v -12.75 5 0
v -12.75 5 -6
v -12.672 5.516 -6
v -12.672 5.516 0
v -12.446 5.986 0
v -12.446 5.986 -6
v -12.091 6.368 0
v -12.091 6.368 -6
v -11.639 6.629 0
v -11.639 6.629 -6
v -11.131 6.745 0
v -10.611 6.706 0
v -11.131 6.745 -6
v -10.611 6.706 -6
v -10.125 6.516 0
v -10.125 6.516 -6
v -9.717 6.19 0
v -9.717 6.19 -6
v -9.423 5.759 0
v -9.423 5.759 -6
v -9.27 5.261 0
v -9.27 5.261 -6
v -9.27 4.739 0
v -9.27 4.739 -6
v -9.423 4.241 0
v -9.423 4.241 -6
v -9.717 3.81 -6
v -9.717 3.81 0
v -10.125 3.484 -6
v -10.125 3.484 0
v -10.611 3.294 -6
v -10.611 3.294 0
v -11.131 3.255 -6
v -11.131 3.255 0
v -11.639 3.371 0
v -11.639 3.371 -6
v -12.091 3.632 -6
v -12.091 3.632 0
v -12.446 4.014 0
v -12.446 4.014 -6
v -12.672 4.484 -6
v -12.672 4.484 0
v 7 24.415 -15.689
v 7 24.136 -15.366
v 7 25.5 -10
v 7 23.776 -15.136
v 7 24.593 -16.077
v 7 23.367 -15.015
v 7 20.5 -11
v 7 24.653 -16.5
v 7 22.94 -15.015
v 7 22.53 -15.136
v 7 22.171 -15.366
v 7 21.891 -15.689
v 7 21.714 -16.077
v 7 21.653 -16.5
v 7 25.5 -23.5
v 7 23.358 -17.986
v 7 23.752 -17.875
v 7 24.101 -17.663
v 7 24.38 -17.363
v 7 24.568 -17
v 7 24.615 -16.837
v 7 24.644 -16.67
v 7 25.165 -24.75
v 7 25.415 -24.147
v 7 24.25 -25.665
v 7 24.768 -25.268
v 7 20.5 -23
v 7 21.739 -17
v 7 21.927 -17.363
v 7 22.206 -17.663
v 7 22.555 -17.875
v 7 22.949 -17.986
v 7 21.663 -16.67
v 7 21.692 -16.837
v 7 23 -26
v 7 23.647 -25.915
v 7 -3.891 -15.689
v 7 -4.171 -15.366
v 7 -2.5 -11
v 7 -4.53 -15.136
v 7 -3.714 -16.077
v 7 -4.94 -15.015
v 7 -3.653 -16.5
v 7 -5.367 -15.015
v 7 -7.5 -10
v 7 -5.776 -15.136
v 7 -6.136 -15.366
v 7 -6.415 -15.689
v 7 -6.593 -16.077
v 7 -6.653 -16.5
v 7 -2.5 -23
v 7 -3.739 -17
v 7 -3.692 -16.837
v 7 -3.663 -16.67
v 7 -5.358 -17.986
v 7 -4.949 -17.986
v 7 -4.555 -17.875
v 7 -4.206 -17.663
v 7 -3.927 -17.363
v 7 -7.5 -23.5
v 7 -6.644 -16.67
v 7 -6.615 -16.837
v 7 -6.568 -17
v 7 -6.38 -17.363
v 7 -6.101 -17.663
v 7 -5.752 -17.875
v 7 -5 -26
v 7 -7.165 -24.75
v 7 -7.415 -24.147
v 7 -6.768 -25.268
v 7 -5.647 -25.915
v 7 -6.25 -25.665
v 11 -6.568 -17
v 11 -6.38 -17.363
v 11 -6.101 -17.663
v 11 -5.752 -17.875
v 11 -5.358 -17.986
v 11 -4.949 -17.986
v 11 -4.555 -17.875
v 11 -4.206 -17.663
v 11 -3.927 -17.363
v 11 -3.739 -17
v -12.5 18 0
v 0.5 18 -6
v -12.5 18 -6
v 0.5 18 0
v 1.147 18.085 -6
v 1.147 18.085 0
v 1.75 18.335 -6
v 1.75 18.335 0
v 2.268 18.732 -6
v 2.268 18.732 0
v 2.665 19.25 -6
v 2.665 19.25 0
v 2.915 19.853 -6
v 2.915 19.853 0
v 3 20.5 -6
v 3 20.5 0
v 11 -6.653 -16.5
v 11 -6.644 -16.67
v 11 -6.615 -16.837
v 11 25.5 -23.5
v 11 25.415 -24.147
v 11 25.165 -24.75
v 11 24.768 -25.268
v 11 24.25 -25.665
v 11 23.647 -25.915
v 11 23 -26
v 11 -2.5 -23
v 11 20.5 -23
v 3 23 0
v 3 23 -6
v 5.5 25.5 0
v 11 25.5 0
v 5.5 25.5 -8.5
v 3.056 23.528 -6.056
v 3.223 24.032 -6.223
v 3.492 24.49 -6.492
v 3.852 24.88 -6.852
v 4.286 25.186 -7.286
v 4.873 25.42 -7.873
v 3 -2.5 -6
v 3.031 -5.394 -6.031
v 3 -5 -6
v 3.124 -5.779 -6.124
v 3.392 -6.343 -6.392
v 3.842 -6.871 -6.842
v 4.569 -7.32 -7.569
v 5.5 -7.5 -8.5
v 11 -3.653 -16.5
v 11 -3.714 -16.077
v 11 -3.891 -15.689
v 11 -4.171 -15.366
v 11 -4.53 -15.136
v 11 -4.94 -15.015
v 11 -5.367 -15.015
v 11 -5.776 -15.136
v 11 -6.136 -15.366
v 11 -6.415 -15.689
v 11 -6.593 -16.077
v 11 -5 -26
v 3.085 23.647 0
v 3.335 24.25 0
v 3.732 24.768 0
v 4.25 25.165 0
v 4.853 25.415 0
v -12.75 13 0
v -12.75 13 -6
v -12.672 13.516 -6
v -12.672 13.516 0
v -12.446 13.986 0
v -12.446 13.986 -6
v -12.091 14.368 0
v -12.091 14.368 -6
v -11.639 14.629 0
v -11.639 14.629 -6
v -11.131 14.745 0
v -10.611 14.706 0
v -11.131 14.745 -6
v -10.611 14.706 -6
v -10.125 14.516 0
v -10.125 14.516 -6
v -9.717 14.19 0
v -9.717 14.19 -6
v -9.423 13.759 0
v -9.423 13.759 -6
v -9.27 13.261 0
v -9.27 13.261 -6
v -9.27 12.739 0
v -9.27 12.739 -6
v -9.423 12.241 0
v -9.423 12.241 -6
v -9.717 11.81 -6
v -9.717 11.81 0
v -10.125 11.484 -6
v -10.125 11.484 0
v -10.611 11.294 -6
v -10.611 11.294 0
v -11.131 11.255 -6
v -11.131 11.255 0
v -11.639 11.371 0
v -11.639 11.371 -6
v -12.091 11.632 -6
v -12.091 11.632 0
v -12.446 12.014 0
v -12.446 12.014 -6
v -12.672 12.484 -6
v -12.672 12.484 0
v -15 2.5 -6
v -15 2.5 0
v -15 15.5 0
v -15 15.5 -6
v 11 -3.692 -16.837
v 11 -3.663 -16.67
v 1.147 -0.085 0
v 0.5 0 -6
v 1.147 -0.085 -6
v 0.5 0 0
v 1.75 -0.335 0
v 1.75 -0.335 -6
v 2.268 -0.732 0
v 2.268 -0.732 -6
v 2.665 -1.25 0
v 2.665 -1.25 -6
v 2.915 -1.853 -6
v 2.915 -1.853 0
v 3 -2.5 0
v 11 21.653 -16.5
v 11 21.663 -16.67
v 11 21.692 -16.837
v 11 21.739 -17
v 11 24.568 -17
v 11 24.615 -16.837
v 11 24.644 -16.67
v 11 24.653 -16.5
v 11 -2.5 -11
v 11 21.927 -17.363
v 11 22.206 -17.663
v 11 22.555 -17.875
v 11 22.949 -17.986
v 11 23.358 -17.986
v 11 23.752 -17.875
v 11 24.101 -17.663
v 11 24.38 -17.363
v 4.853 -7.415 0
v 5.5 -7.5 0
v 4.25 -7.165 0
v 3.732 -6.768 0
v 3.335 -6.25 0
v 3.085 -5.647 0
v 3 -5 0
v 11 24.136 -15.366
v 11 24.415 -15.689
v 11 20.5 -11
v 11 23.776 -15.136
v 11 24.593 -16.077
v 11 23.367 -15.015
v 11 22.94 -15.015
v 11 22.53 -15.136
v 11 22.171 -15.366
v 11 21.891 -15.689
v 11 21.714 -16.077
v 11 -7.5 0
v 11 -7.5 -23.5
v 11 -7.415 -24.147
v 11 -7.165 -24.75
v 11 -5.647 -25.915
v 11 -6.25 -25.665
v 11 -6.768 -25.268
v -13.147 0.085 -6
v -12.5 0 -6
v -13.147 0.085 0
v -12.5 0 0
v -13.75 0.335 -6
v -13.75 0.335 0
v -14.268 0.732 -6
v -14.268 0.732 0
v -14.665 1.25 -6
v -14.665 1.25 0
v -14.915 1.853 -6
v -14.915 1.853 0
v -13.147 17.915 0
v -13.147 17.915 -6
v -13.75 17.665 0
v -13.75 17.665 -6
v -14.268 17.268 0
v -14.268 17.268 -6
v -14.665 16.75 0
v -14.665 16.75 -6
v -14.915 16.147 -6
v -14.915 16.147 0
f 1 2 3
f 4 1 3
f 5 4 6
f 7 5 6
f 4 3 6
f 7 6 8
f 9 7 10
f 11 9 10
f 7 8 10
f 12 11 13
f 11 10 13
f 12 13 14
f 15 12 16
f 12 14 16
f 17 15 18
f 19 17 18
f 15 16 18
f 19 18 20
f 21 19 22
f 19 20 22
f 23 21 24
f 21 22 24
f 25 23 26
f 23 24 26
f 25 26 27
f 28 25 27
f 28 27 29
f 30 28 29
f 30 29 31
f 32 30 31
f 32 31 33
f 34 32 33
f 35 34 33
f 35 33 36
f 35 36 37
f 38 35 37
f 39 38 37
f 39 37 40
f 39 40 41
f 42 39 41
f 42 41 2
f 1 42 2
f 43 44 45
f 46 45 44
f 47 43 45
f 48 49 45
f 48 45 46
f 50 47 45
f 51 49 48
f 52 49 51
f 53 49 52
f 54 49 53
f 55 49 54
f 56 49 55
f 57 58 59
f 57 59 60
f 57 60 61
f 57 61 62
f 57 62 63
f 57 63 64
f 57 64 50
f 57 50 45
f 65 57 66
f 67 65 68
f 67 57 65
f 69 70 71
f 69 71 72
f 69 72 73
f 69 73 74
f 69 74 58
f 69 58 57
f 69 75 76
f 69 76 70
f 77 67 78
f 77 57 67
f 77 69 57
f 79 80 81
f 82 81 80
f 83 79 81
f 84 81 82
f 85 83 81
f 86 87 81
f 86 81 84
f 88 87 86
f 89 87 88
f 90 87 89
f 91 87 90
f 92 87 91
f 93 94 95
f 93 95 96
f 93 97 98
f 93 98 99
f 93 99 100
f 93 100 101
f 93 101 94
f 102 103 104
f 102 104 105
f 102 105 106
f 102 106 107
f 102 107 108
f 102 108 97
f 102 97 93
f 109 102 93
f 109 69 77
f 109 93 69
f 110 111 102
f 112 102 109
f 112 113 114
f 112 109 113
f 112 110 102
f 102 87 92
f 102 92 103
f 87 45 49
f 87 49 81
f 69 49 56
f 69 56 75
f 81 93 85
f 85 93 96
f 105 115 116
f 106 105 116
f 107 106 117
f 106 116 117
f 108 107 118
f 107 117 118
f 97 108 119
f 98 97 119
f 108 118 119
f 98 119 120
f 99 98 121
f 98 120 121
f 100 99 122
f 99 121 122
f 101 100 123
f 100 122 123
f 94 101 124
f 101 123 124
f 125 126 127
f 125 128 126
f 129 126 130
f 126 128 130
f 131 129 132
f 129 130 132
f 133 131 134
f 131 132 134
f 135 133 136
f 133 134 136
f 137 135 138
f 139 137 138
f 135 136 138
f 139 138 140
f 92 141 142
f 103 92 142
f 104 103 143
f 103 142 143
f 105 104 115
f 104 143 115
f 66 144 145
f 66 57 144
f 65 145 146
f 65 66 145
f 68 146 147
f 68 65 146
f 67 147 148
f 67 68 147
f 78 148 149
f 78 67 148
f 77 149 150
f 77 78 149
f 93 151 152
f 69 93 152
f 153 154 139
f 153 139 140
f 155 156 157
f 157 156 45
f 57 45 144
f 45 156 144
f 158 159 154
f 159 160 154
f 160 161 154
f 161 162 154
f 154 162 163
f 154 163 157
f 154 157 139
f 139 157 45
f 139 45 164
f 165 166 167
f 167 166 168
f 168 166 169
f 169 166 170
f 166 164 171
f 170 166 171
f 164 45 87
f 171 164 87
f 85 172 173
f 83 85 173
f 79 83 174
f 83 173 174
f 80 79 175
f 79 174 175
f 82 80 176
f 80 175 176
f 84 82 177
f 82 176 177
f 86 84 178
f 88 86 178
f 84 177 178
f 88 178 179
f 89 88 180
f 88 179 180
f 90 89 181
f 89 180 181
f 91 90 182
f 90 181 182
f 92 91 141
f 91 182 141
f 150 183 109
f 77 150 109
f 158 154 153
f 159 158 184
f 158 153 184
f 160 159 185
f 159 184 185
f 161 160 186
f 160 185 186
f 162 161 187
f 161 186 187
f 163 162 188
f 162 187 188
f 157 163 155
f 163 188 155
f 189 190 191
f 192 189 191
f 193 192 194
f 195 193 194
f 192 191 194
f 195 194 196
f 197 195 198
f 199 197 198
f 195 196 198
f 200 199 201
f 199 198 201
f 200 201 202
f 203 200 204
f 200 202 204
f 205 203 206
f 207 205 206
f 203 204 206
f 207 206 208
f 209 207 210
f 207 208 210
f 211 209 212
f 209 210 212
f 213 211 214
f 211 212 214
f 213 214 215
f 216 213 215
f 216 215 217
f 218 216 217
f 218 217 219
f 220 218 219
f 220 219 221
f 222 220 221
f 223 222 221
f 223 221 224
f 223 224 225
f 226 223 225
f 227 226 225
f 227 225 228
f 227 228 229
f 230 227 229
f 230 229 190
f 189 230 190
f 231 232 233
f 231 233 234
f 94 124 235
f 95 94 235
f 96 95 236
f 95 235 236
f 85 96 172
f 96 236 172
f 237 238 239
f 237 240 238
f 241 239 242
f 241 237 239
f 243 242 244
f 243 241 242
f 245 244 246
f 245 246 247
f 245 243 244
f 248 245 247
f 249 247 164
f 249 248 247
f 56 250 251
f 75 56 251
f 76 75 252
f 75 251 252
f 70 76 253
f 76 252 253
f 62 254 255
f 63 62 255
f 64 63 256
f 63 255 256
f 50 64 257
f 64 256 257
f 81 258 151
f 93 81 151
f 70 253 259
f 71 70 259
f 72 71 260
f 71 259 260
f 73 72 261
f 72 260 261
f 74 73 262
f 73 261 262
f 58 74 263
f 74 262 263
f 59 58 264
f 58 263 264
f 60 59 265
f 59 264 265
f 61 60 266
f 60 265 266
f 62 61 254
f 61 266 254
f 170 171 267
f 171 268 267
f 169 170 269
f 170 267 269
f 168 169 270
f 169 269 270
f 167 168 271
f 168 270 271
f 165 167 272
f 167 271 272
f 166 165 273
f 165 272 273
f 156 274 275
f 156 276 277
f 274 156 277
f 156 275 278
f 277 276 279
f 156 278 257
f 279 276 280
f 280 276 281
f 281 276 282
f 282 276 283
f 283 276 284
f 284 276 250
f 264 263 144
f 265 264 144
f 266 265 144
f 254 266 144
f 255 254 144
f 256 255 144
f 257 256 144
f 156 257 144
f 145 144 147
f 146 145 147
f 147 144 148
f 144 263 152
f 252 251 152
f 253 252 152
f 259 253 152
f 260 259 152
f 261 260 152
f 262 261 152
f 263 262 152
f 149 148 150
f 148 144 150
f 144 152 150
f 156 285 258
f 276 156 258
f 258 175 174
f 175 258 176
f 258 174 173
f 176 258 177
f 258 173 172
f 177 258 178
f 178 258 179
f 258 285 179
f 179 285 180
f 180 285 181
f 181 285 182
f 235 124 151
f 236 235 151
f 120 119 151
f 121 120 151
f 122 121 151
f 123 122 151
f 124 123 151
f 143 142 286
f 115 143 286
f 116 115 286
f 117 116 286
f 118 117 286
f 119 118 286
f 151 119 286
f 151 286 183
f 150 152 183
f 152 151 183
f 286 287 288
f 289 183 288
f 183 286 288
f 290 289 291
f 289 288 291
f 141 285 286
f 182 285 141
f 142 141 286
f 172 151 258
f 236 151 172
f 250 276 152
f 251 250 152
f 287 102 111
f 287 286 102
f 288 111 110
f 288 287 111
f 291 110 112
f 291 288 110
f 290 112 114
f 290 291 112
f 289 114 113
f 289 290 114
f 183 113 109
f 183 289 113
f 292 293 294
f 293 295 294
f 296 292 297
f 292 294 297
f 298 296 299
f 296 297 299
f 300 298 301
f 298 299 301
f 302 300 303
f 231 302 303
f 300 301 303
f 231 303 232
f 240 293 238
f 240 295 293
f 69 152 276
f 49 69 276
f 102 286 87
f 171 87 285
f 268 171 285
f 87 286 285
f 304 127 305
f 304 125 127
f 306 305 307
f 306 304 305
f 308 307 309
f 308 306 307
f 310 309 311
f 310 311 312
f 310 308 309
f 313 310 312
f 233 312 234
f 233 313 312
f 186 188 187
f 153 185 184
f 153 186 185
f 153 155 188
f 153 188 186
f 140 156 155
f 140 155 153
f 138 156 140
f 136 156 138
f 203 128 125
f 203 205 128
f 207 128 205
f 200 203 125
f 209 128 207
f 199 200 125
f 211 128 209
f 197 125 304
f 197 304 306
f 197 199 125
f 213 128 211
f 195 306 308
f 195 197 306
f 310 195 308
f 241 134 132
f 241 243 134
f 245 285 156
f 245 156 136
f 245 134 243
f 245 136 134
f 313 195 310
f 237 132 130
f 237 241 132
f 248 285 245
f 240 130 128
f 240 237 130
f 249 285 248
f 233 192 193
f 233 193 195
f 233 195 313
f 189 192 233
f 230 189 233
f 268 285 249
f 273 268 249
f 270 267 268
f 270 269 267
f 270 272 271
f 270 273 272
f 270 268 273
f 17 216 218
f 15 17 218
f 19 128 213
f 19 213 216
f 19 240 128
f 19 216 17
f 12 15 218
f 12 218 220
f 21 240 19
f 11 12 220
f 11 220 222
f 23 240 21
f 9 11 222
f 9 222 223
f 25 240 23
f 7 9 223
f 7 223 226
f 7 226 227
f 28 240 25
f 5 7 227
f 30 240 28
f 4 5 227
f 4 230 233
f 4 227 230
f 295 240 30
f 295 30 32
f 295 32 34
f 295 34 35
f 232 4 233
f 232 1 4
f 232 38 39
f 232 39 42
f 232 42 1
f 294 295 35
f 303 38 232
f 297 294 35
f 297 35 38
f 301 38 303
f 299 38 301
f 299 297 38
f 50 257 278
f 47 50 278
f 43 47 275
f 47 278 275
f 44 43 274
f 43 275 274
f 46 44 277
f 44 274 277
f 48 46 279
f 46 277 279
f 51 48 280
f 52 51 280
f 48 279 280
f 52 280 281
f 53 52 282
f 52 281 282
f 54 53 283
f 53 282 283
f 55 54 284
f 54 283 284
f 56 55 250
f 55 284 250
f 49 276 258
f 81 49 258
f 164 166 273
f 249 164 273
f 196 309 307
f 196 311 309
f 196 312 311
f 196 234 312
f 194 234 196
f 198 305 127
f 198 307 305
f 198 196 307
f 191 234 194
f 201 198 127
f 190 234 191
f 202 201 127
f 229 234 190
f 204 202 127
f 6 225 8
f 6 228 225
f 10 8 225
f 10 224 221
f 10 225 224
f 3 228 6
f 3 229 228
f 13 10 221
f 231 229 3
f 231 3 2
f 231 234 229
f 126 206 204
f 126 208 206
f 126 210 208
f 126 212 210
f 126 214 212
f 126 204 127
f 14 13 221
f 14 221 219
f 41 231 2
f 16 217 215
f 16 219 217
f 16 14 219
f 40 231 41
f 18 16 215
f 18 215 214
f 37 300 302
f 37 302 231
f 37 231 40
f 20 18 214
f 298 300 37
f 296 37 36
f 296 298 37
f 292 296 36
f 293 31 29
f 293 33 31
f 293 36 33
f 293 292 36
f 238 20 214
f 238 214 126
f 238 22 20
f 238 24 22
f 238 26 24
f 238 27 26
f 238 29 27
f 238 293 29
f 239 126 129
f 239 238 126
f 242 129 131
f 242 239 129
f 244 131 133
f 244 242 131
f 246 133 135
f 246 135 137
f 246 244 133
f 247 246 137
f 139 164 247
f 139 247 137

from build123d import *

# Parameters (mm, degrees)
F0_W      = 4
F0_H      = 18
F1_DEPTH  = 26
F0_W_2    = 7
F2_DEPTH  = 6
F3_W      = 4
F3_H      = 18
F4_DEPTH  = 15
F5_W      = 4
F5_H      = 18
F6_DEPTH  = 15
F7_W      = 11.5
F7_H      = 5.5
F7_H_2    = 6
F7_H_3    = 0.5
F8_DEPTH  = 25
F9_DEPTH  = 15
F10_DEPTH = 18
F11_DEPTH = 2
F12_DEPTH = 6
F13_DEPTH = 6
F14_DEPTH = 11
F15_W     = 9
F15_H     = 8
F16_DEPTH = 30
F18_D     = 3.5
F19_W     = 18
F19_H     = 6
F20_DEPTH = 9
F21_W     = 18
F21_H     = 6
F22_DEPTH = 9
F23_SIZE  = 4
F24_DEPTH = 1.5
F25_DEPTH = 1.5
F26_R     = 2.5


with BuildPart() as f1:
    # F0 (on Top) → F1 (new body)
    with BuildSketch(Plane.XY):
        with Locations((9, 9)):
            Rectangle(F0_W, F0_H)
    extrude(amount=-F1_DEPTH)

    # F0 (on Top) → F2 (join)
    with BuildSketch(Plane.XY):
        with Locations((3.5, 9)):
            Rectangle(F0_W_2, F0_H)
        with Locations((9, 9)):
            Rectangle(F0_W, F0_H)
    extrude(amount=-F2_DEPTH)

    # F3 (on face) → F4 (join)
    with BuildSketch(Plane.XZ):
        with Locations((9, -17)):
            Rectangle(F3_W, F3_H)
    extrude(amount=F4_DEPTH)

    # F5 (on face) → F6 (join)
    with BuildSketch(Plane(origin=(0, 18, 0), x_dir=(-1, 0, 0), z_dir=(0, 1, 0))):
        with Locations((-9, -17)):
            Rectangle(F5_W, F5_H)
    extrude(amount=F6_DEPTH)

    # F7 (on face) → F8 (cut)
    with BuildSketch(Plane.YZ.offset(11)):
        with Locations((3.25, -13.75)):
            Rectangle(F7_W, F7_H)
        with Locations((14.75, -13.75)):
            Rectangle(F7_W, F7_H)
        with BuildLine():
            Line((24.5675133947, -17), (21.7390862699, -17))
            ThreePointArc((21.7390862699, -17), (23.1532998323, -18), (24.5675133947, -17))
        make_face()
        with BuildLine():
            Line((24.6532998323, -16.5), (21.6532998323, -16.5))
            ThreePointArc((21.6532998323, -16.5), (21.6749019928, -16.7536529681), (21.7390862699, -17))
            Line((21.7390862699, -17), (24.5675133947, -17))
            ThreePointArc((24.5675133947, -17), (24.6316976718, -16.7536529681), (24.6532998323, -16.5))
        make_face()
        with BuildLine():
            ThreePointArc((24.6532998323, -16.5), (23.1532998323, -15), (21.6532998323, -16.5))
            Line((21.6532998323, -16.5), (24.6532998323, -16.5))
        make_face()
        with Locations((14.75, -20)):
            Rectangle(F7_W, F7_H_2)
        with Locations((14.75, -16.75)):
            Rectangle(F7_W, F7_H_3)
        with Locations((3.25, -20)):
            Rectangle(F7_W, F7_H_2)
        with Locations((3.25, -16.75)):
            Rectangle(F7_W, F7_H_3)
        with BuildLine():
            ThreePointArc((-3.6532998323, -16.5), (-5.1532998323, -15), (-6.6532998323, -16.5))
            Line((-6.6532998323, -16.5), (-3.6532998323, -16.5))
        make_face()
        with BuildLine():
            Line((-3.6532998323, -16.5), (-6.6532998323, -16.5))
            ThreePointArc((-6.6532998323, -16.5), (-6.6316976718, -16.7536529681), (-6.5675133947, -17))
            Line((-6.5675133947, -17), (-3.7390862699, -17))
            ThreePointArc((-3.7390862699, -17), (-3.6749019928, -16.7536529681), (-3.6532998323, -16.5))
        make_face()
        with BuildLine():
            Line((-3.7390862699, -17), (-6.5675133947, -17))
            ThreePointArc((-6.5675133947, -17), (-5.1532998323, -18), (-3.7390862699, -17))
        make_face()
    extrude(amount=-F8_DEPTH, mode=Mode.SUBTRACT)

    # F9 (add): a face of the model
    f9_faces = [f1.faces().sort_by_distance(p)[0] for p in [
        (0, 9, -3),
    ]]
    extrude(f9_faces, amount=F9_DEPTH)

    # F10 (add): a face of the model
    f10_faces = [f1.faces().sort_by_distance(p)[0] for p in [
        (-1.4634146341, 0, -3.1951219512),
    ]]
    extrude(f10_faces, amount=F10_DEPTH)

    # F11 (cut): a face of the model
    f11_faces = [f1.faces().sort_by_distance(p)[0] for p in [
        (-1.4634146341, 18, -3.1951219512),
    ]]
    extrude(f11_faces, amount=-F11_DEPTH, mode=Mode.SUBTRACT)

    # F12 (cut): a face of the model
    f12_faces = [f1.faces().sort_by_distance(p)[0] for p in [
        (9, -15, -17),
    ]]
    extrude(f12_faces, amount=-F12_DEPTH, mode=Mode.SUBTRACT)

    # F13 (cut): a face of the model
    f13_faces = [f1.faces().sort_by_distance(p)[0] for p in [
        (9, 33, -17),
    ]]
    extrude(f13_faces, amount=-F13_DEPTH, mode=Mode.SUBTRACT)

    # F14 (add): a face of the model
    f14_faces = [f1.faces().sort_by_distance(p)[0] for p in [
        (-1.4634146341, 16, -3.1951219512),
    ]]
    extrude(f14_faces, amount=F14_DEPTH)

    # F15 (on face) → F16 (cut)
    with BuildSketch(Plane.YZ.offset(11)):
        with Locations((-13.5, -4)):
            Rectangle(F15_W, F15_H)
    extrude(amount=-F16_DEPTH, mode=Mode.SUBTRACT)

    # F18 (through all)
    with Locations(Plane.XY):
        with Locations((-11, 13), (-11, 5)):
            Hole(F18_D / 2)

    # F19 (on face) → F20 (cut)
    with BuildSketch(Plane.XZ.offset(9)):
        with Locations((-6, -3)):
            Rectangle(F19_W, F19_H)
    extrude(amount=-F20_DEPTH, mode=Mode.SUBTRACT)

    # F21 (on face) → F22 (cut)
    with BuildSketch(Plane(origin=(0, 27, 0), x_dir=(-1, 0, 0), z_dir=(0, 1, 0))):
        with Locations((6, -3)):
            Rectangle(F21_W, F21_H)
    extrude(amount=-F22_DEPTH, mode=Mode.SUBTRACT)

    # F23
    f23_edges = [f1.edges().sort_by_distance(p)[0] for p in [
        (7, 9, -6),
    ]]
    chamfer(f23_edges, length=F23_SIZE)

    # F24 (cut): a face of the model
    f24_faces = [f1.faces().sort_by_distance(p)[0] for p in [
        (8.0980392157, -9, -10.9019607843),
    ]]
    extrude(f24_faces, amount=-F24_DEPTH, mode=Mode.SUBTRACT)

    # F25 (cut): a face of the model
    f25_faces = [f1.faces().sort_by_distance(p)[0] for p in [
        (8.0980392157, 27, -10.9019607843),
    ]]
    extrude(f25_faces, amount=-F25_DEPTH, mode=Mode.SUBTRACT)

    # F26
    f26_edges = [f1.edges().sort_by_distance(p)[0] for p in [
        (9, 25.5, -26),
        (3, 25.5, -3),
        (-15, 18, -3),
        (9, -7.5, -26),
        (3, -7.5, -3),
        (3, 0, -3),
        (3, 18, -3),
        (-15, 0, -3),
    ]]
    fillet(f26_edges, radius=F26_R)


solid = f1.part
